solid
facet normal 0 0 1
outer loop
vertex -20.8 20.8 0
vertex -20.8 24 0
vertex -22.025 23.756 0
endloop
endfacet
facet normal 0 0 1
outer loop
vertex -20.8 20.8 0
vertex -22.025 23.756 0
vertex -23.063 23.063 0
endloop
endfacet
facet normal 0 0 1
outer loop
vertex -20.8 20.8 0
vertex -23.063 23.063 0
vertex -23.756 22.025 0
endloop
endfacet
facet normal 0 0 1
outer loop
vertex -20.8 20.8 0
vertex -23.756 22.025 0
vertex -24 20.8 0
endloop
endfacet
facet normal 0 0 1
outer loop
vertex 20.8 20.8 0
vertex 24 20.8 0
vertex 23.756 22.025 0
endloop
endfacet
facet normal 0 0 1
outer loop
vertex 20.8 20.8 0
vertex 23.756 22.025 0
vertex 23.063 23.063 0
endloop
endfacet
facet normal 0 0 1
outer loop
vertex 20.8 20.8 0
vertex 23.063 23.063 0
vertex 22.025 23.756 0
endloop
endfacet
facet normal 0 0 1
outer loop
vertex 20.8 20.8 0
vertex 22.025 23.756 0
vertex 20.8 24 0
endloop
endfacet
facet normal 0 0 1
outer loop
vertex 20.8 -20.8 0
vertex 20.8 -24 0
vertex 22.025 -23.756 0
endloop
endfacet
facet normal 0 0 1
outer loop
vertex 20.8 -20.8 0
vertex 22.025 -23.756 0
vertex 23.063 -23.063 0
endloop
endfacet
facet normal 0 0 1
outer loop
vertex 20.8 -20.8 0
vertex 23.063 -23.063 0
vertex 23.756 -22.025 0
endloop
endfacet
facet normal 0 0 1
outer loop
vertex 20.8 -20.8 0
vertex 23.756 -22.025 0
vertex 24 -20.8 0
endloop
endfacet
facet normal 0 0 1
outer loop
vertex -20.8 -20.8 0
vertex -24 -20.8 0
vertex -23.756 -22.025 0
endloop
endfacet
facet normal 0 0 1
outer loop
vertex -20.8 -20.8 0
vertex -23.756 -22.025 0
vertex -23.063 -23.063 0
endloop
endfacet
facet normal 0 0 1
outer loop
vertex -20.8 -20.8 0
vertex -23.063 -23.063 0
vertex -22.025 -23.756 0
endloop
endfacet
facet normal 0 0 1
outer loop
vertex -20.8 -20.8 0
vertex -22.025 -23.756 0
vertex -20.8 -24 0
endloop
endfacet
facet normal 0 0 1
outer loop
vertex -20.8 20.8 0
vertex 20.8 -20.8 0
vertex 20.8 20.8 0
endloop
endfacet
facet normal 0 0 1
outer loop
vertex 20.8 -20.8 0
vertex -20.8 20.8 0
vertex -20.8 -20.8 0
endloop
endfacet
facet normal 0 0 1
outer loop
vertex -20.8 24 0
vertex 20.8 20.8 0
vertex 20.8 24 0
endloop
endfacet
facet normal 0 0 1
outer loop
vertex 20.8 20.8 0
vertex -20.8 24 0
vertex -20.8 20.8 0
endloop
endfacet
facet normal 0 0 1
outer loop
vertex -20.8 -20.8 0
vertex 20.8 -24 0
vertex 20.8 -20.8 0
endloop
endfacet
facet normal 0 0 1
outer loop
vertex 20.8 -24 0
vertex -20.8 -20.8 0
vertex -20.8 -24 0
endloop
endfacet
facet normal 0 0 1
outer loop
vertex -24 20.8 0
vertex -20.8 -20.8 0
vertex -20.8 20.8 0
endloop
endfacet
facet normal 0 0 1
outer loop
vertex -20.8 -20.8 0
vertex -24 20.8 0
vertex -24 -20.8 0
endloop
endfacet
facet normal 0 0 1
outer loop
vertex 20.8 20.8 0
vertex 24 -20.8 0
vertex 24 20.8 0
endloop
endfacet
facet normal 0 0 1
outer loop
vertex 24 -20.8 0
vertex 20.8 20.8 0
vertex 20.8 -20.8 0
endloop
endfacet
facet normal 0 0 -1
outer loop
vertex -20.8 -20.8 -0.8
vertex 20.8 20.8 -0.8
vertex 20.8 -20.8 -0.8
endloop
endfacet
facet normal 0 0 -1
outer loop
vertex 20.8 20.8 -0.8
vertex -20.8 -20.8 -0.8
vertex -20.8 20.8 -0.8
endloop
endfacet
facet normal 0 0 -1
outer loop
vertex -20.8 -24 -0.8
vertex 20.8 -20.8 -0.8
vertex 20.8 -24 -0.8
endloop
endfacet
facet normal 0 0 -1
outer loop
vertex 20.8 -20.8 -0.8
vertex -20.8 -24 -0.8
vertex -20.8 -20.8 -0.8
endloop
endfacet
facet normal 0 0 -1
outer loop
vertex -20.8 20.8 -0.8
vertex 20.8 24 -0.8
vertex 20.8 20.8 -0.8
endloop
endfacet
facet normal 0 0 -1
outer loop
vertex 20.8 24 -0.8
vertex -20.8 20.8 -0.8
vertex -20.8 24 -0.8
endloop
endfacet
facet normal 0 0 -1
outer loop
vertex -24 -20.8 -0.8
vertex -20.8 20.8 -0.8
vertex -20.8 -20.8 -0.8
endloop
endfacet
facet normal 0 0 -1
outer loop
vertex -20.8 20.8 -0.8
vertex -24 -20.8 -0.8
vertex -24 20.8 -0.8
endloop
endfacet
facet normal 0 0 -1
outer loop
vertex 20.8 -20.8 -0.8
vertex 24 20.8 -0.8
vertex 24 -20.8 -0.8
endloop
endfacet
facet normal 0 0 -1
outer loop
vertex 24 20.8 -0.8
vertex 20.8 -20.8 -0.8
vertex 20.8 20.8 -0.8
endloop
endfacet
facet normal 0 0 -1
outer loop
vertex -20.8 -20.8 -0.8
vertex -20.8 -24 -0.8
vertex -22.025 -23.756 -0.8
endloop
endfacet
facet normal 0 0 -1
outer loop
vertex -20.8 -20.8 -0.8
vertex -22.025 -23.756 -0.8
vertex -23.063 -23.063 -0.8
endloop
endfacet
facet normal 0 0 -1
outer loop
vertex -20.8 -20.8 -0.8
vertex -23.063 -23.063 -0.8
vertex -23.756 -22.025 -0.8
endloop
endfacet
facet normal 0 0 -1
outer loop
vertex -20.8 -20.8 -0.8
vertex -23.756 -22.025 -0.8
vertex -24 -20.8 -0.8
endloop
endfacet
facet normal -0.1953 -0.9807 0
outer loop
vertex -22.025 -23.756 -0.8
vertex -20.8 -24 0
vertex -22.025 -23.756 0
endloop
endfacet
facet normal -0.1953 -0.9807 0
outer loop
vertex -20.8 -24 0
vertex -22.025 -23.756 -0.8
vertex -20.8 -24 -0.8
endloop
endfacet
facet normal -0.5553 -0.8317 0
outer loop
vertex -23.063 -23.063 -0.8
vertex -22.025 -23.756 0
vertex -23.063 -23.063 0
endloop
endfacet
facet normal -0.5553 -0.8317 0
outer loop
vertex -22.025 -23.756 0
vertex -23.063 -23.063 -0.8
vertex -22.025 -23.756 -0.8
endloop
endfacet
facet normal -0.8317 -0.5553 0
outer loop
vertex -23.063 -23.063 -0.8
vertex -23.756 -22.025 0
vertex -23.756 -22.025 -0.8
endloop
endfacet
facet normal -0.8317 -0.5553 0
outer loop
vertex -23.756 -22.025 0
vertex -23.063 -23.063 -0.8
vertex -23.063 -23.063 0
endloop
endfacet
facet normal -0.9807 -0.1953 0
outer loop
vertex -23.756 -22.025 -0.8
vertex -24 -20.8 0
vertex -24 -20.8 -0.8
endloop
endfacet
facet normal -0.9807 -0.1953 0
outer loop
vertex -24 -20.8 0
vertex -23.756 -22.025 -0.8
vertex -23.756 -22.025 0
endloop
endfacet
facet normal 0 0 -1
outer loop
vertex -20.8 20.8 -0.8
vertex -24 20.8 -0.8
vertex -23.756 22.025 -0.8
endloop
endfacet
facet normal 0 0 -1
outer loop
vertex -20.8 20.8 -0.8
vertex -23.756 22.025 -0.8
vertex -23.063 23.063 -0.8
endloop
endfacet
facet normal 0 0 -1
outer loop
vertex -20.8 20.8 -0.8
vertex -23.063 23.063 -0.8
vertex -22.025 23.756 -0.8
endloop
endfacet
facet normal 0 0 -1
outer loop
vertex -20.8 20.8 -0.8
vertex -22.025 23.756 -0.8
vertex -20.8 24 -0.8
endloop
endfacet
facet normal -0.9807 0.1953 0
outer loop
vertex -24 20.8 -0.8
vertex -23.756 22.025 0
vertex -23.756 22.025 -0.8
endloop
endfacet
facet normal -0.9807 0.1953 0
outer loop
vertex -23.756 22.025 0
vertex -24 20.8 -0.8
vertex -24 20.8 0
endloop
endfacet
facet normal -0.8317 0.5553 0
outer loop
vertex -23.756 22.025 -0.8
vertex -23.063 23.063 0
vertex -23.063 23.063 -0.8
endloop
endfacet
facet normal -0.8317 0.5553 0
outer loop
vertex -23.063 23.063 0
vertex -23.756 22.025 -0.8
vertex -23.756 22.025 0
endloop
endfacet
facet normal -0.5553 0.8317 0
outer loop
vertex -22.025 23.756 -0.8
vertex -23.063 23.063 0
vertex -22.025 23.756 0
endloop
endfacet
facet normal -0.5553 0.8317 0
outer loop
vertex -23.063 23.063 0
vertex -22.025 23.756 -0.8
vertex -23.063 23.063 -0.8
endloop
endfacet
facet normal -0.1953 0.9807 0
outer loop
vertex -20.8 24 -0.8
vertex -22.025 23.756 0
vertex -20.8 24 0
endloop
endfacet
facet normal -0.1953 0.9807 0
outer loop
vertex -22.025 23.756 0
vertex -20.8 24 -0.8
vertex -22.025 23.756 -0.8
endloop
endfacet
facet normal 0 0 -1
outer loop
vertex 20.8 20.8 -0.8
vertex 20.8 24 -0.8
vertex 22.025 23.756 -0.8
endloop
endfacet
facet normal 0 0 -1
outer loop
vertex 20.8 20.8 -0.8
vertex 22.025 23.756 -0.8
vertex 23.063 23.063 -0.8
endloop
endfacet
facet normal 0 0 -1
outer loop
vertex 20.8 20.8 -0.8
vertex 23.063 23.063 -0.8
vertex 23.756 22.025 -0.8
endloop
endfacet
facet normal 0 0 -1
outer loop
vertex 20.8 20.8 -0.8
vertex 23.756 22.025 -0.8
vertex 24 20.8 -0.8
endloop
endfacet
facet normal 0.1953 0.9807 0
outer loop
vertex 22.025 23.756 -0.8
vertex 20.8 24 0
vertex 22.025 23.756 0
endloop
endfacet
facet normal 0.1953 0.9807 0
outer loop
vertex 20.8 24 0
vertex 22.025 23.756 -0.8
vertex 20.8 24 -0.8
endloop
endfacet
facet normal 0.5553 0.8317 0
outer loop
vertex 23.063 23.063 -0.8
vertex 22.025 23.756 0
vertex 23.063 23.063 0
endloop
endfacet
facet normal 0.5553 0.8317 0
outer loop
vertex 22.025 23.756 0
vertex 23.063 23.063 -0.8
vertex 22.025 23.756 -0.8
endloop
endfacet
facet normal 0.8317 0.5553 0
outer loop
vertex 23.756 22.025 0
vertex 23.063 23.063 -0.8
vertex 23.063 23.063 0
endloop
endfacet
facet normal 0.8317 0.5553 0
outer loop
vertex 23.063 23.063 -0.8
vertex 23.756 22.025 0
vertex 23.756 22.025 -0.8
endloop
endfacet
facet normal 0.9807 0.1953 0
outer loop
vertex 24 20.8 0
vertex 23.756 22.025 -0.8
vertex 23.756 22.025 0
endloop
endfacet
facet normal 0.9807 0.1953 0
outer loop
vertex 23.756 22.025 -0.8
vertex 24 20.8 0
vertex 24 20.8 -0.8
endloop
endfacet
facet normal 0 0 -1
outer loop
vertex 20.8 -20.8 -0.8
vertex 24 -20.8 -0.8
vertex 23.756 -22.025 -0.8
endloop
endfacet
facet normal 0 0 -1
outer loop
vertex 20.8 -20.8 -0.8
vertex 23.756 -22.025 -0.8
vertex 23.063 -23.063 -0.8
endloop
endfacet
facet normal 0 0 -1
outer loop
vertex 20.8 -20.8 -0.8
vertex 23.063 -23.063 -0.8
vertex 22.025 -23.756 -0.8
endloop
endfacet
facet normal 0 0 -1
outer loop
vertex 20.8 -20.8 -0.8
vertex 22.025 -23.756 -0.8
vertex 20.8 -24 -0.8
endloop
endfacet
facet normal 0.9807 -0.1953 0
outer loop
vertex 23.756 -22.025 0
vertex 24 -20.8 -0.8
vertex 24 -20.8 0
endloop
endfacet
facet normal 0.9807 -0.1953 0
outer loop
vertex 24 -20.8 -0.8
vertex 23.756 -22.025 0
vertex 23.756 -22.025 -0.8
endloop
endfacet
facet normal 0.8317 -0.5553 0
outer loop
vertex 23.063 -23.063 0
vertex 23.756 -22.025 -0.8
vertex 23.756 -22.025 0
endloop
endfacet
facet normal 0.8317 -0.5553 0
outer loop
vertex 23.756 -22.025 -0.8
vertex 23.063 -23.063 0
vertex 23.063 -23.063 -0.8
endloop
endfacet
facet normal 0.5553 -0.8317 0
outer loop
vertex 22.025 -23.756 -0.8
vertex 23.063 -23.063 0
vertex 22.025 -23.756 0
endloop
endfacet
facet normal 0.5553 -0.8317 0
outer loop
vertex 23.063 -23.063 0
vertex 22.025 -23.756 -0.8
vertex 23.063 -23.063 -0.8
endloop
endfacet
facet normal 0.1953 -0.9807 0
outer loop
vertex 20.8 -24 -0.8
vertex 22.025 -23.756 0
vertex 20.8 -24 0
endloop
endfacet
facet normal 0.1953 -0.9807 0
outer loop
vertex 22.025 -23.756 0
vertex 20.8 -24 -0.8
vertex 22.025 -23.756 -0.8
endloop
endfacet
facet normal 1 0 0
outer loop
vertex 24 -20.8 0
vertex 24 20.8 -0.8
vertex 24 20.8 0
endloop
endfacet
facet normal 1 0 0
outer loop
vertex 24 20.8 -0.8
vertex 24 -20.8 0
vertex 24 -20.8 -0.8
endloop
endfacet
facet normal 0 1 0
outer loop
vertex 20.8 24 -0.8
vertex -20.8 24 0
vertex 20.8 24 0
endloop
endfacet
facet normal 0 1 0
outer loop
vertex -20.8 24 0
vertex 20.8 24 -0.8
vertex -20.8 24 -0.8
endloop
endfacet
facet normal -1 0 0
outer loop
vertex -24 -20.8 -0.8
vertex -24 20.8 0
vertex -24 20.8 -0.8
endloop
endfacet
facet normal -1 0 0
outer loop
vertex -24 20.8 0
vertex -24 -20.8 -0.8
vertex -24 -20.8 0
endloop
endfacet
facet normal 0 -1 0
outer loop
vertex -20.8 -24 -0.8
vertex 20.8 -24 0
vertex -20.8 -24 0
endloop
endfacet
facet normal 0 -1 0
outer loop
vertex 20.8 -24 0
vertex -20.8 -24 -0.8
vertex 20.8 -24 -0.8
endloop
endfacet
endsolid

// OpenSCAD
// file: ../p/1-4edge.scad
use <../lib.scad>
function ldraw_lib__1_4edge() = [
// 0 Circle 0.25
// 0 Name: 1-4edge.dat
// 0 Author: James Jessiman
// 0 !LDRAW_ORG Primitive UPDATE 2017-01
// 0 !LICENSE Licensed under CC BY 2.0 and CC BY 4.0 : see CAreadme.txt
// 
// 0 BFC CERTIFY CCW
  [0,"BFC","CERTIFY"],
  [0,"BFC","CCW"],
// 
// 0 !HISTORY 2007-06-22 [PTadmin] Header formatted for Contributor Agreement
// 0 !HISTORY 2008-07-01 [PTadmin] Official Update 2008-01
// 0 !HISTORY 2017-01-15 [Steffen] BFCed
// 0 !HISTORY 2017-12-30 [PTadmin] Official Update 2017-01
// 
// 
// 2 24 1 0 0 0.9239 0 0.3827
  [2,24,1,0,0,0.9239,0,0.3827],
// 2 24 0.9239 0 0.3827 0.7071 0 0.7071
  [2,24,0.9239,0,0.3827,0.7071,0,0.7071],
// 2 24 0.7071 0 0.7071 0.3827 0 0.9239
  [2,24,0.7071,0,0.7071,0.3827,0,0.9239],
// 2 24 0.3827 0 0.9239 0 0 1
  [2,24,0.3827,0,0.9239,0,0,1],
];
module ldraw_lib__1_4edge(step=0, col=false, unit=2/5, alt=false, line=0.2, solid=!$preview)
    makepoly(ldraw_lib__1_4edge(), step=step, col=col, unit=unit, alt=alt, line=line, solid=solid);
ldraw_lib__1_4edge(line=0.2);
// file: ../p/1-4cyli.scad
use <../lib.scad>
function ldraw_lib__1_4cyli() = [
// 0 Cylinder 0.25
// 0 Name: 1-4cyli.dat
// 0 Author: James Jessiman
// 0 !LDRAW_ORG Primitive UPDATE 2012-01
// 0 !LICENSE Licensed under CC BY 2.0 and CC BY 4.0 : see CAreadme.txt
// 
// 0 BFC CERTIFY CCW
  [0,"BFC","CERTIFY"],
  [0,"BFC","CCW"],
// 
// 0 !HISTORY 2002-03-23 [sbliss] Added BFC statement.
// 0 !HISTORY 2002-04-25 [PTadmin] Official Update 2002-02
// 0 !HISTORY 2007-06-22 [PTadmin] Header formatted for Contributor Agreement
// 0 !HISTORY 2008-07-01 [PTadmin] Official Update 2008-01
// 0 !HISTORY 2012-02-16 [Philo] Changed to CCW
// 0 !HISTORY 2012-03-30 [PTadmin] Official Update 2012-01
// 
// 
// 4 16 1 1 0 0.9239 1 0.3827 0.9239 0 0.3827 1 0 0
  [4,16,1,1,0,0.9239,1,0.3827,0.9239,0,0.3827,1,0,0],
// 5 24 1 0 0 1 1 0 0.9239 0 0.3827 1 0 -1
  [5,24,1,0,0,1,1,0,0.9239,0,0.3827,1,0,-1],
// 4 16 0.9239 1 0.3827 0.7071 1 0.7071 0.7071 0 0.7071 0.9239 0 0.3827
  [4,16,0.9239,1,0.3827,0.7071,1,0.7071,0.7071,0,0.7071,0.9239,0,0.3827],
// 5 24 0.9239 0 0.3827 0.9239 1 0.3827 0.7071 0 0.7071 1 0 0
  [5,24,0.9239,0,0.3827,0.9239,1,0.3827,0.7071,0,0.7071,1,0,0],
// 4 16 0.7071 1 0.7071 0.3827 1 0.9239 0.3827 0 0.9239 0.7071 0 0.7071
  [4,16,0.7071,1,0.7071,0.3827,1,0.9239,0.3827,0,0.9239,0.7071,0,0.7071],
// 5 24 0.7071 0 0.7071 0.7071 1 0.7071 0.3827 0 0.9239 0.9239 0 0.3827
  [5,24,0.7071,0,0.7071,0.7071,1,0.7071,0.3827,0,0.9239,0.9239,0,0.3827],
// 4 16 0.3827 1 0.9239 0 1 1 0 0 1 0.3827 0 0.9239
  [4,16,0.3827,1,0.9239,0,1,1,0,0,1,0.3827,0,0.9239],
// 5 24 0.3827 0 0.9239 0.3827 1 0.9239 0 0 1 0.7071 0 0.7071
  [5,24,0.3827,0,0.9239,0.3827,1,0.9239,0,0,1,0.7071,0,0.7071],
// 5 24 0 0 1 0 1 1 0.3827 0 0.9239 -1 0 1
  [5,24,0,0,1,0,1,1,0.3827,0,0.9239,-1,0,1],
];
module ldraw_lib__1_4cyli(step=0, col=false, unit=2/5, alt=false, line=0.2, solid=!$preview)
    makepoly(ldraw_lib__1_4cyli(), step=step, col=col, unit=unit, alt=alt, line=line, solid=solid);
ldraw_lib__1_4cyli(line=0.2);
// file: ../p/1-4disc.scad
use <../lib.scad>
function ldraw_lib__1_4disc() = [
// 0 Disc 0.25
// 0 Name: 1-4disc.dat
// 0 Author: James Jessiman
// 0 !LDRAW_ORG Primitive UPDATE 2002-02
// 0 !LICENSE Licensed under CC BY 2.0 and CC BY 4.0 : see CAreadme.txt
// 
// 0 BFC CERTIFY CCW
  [0,"BFC","CERTIFY"],
  [0,"BFC","CCW"],
// 
// 0 !HISTORY 2002-03-23 [sbliss] Added BFC statement.
// 0 !HISTORY 2002-04-25 [PTadmin] Official Update 2002-02
// 0 !HISTORY 2007-06-22 [PTadmin] Header formatted for Contributor Agreement
// 0 !HISTORY 2008-07-01 [PTadmin] Official Update 2008-01
// 
// 
// 3 16 0 0 0 1 0 0 0.9239 0 0.3827
  [3,16,0,0,0,1,0,0,0.9239,0,0.3827],
// 3 16 0 0 0 0.9239 0 0.3827 0.7071 0 0.7071
  [3,16,0,0,0,0.9239,0,0.3827,0.7071,0,0.7071],
// 3 16 0 0 0 0.7071 0 0.7071 0.3827 0 0.9239
  [3,16,0,0,0,0.7071,0,0.7071,0.3827,0,0.9239],
// 3 16 0 0 0 0.3827 0 0.9239 0 0 1
  [3,16,0,0,0,0.3827,0,0.9239,0,0,1],
// 0
];
module ldraw_lib__1_4disc(step=0, col=false, unit=2/5, alt=false, line=0.2, solid=!$preview)
    makepoly(ldraw_lib__1_4disc(), step=step, col=col, unit=unit, alt=alt, line=line, solid=solid);
ldraw_lib__1_4disc(line=0.2);
// file: ../p/1-4cylc.scad
use <../lib.scad>
use <1-4cyli.scad>
use <1-4disc.scad>
use <1-4edge.scad>
function ldraw_lib__1_4cylc() = [
// 0 Cylinder Closed 0.25
// 0 Name: 1-4cylc.dat
// 0 Author: Mark Kennedy [mkennedy]
// 0 !LDRAW_ORG Primitive UPDATE 2010-01
// 0 !LICENSE Licensed under CC BY 2.0 and CC BY 4.0 : see CAreadme.txt
// 
// 0 BFC CERTIFY CCW
  [0,"BFC","CERTIFY"],
  [0,"BFC","CCW"],
// 
// 0 !HISTORY 2010-04-05 [PTadmin] Official Update 2010-01
// 
// 
// 1 16 0 0 0 1 0 0 0 1 0 0 0 1 1-4edge.dat
  [1,16,0,0,0,1,0,0,0,1,0,0,0,1, ldraw_lib__1_4edge()],
// 1 16 0 1 0 1 0 0 0 1 0 0 0 1 1-4edge.dat
  [1,16,0,1,0,1,0,0,0,1,0,0,0,1, ldraw_lib__1_4edge()],
// 1 16 0 0 0 1 0 0 0 1 0 0 0 1 1-4disc.dat
  [1,16,0,0,0,1,0,0,0,1,0,0,0,1, ldraw_lib__1_4disc()],
// 1 16 0 0 0 1 0 0 0 1 0 0 0 1 1-4cyli.dat
  [1,16,0,0,0,1,0,0,0,1,0,0,0,1, ldraw_lib__1_4cyli()],
// 0
];
module ldraw_lib__1_4cylc(step=0, col=false, unit=2/5, alt=false, line=0.2, solid=!$preview)
    makepoly(ldraw_lib__1_4cylc(), step=step, col=col, unit=unit, alt=alt, line=line, solid=solid);
ldraw_lib__1_4cylc(line=0.2);
// main file
use <../lib.scad>
use <../p/1-4cylc.scad>
use <../p/1-4disc.scad>
function ldraw_lib__u9252() = [
// 0 Cardboard  6 x  6 Thick with Rounded Corners
// 0 Name: u9252.dat
// 0 Author: Steffen [Steffen]
// 0 !LDRAW_ORG Part UPDATE 2020-02
// 0 !LICENSE Licensed under CC BY 2.0 and CC BY 4.0 : see CAreadme.txt
// 
// 0 BFC CERTIFY CCW
  [0,"BFC","CERTIFY"],
  [0,"BFC","CCW"],
// 
// 0 !CATEGORY Sheet Cardboard
// 0 !KEYWORDS Scala, set 4336
// 
// 0 !HISTORY 2020-09-05 [PTadmin] Official Update 2020-02
// 
// 
// 1 16 -52 0 52 0 0 -8 0 1 0 8 0 0 1-4disc.dat
  [1,16,-52,0,52,0,0,-8,0,1,0,8,0,0, ldraw_lib__1_4disc()],
// 1 16 52 0 52 8 0 0 0 1 0 0 0 8 1-4disc.dat
  [1,16,52,0,52,8,0,0,0,1,0,0,0,8, ldraw_lib__1_4disc()],
// 1 16 52 0 -52 0 0 8 0 1 0 -8 0 0 1-4disc.dat
  [1,16,52,0,-52,0,0,8,0,1,0,-8,0,0, ldraw_lib__1_4disc()],
// 1 16 -52 0 -52 -8 0 0 0 1 0 0 0 -8 1-4disc.dat
  [1,16,-52,0,-52,-8,0,0,0,1,0,0,0,-8, ldraw_lib__1_4disc()],
// 4 16 -52 0 -52 52 0 -52 52 0 52 -52 0 52
  [4,16,-52,0,-52,52,0,-52,52,0,52,-52,0,52],
// 4 16 -52 0 52 52 0 52 52 0 60 -52 0 60
  [4,16,-52,0,52,52,0,52,52,0,60,-52,0,60],
// 4 16 -52 0 -60 52 0 -60 52 0 -52 -52 0 -52
  [4,16,-52,0,-60,52,0,-60,52,0,-52,-52,0,-52],
// 4 16 -52 0 -52 -52 0 52 -60 0 52 -60 0 -52
  [4,16,-52,0,-52,-52,0,52,-60,0,52,-60,0,-52],
// 4 16 60 0 -52 60 0 52 52 0 52 52 0 -52
  [4,16,60,0,-52,60,0,52,52,0,52,52,0,-52],
// 
// 4 16 -52 2 52 52 2 52 52 2 -52 -52 2 -52
  [4,16,-52,2,52,52,2,52,52,2,-52,-52,2,-52],
// 4 16 -52 2 -52 52 2 -52 52 2 -60 -52 2 -60
  [4,16,-52,2,-52,52,2,-52,52,2,-60,-52,2,-60],
// 4 16 -52 2 60 52 2 60 52 2 52 -52 2 52
  [4,16,-52,2,60,52,2,60,52,2,52,-52,2,52],
// 4 16 -52 2 52 -52 2 -52 -60 2 -52 -60 2 52
  [4,16,-52,2,52,-52,2,-52,-60,2,-52,-60,2,52],
// 4 16 60 2 52 60 2 -52 52 2 -52 52 2 52
  [4,16,60,2,52,60,2,-52,52,2,-52,52,2,52],
// 
// 1 16 -52 2 -52 0 0 -8 0 -2 0 -8 0 0 1-4cylc.dat
  [1,16,-52,2,-52,0,0,-8,0,-2,0,-8,0,0, ldraw_lib__1_4cylc()],
// 1 16 -52 2 52 -8 0 0 0 -2 0 0 0 8 1-4cylc.dat
  [1,16,-52,2,52,-8,0,0,0,-2,0,0,0,8, ldraw_lib__1_4cylc()],
// 1 16 52 2 52 0 0 8 0 -2 0 8 0 0 1-4cylc.dat
  [1,16,52,2,52,0,0,8,0,-2,0,8,0,0, ldraw_lib__1_4cylc()],
// 1 16 52 2 -52 8 0 0 0 -2 0 0 0 -8 1-4cylc.dat
  [1,16,52,2,-52,8,0,0,0,-2,0,0,0,-8, ldraw_lib__1_4cylc()],
// 
// 4 16 60 2 -52 60 2 52 60 0 52 60 0 -52
  [4,16,60,2,-52,60,2,52,60,0,52,60,0,-52],
// 4 16 52 2 60 -52 2 60 -52 0 60 52 0 60
  [4,16,52,2,60,-52,2,60,-52,0,60,52,0,60],
// 4 16 -60 2 52 -60 2 -52 -60 0 -52 -60 0 52
  [4,16,-60,2,52,-60,2,-52,-60,0,-52,-60,0,52],
// 4 16 -52 2 -60 52 2 -60 52 0 -60 -52 0 -60
  [4,16,-52,2,-60,52,2,-60,52,0,-60,-52,0,-60],
// 
// 2 24 -52 0 -60 52 0 -60
  [2,24,-52,0,-60,52,0,-60],
// 2 24 -52 2 -60 52 2 -60
  [2,24,-52,2,-60,52,2,-60],
// 2 24 60 0 -52 60 0 52
  [2,24,60,0,-52,60,0,52],
// 2 24 60 2 -52 60 2 52
  [2,24,60,2,-52,60,2,52],
// 2 24 52 0 60 -52 0 60
  [2,24,52,0,60,-52,0,60],
// 2 24 52 2 60 -52 2 60
  [2,24,52,2,60,-52,2,60],
// 2 24 -60 0 52 -60 0 -52
  [2,24,-60,0,52,-60,0,-52],
// 2 24 -60 2 52 -60 2 -52
  [2,24,-60,2,52,-60,2,-52],
];
module ldraw_lib__u9252(step=0, col=false, unit=2/5, alt=false, line=0.2, solid=!$preview)
    makepoly(ldraw_lib__u9252(), step=step, col=col, unit=unit, alt=alt, line=line, solid=solid);
ldraw_lib__u9252(line=0.2);
